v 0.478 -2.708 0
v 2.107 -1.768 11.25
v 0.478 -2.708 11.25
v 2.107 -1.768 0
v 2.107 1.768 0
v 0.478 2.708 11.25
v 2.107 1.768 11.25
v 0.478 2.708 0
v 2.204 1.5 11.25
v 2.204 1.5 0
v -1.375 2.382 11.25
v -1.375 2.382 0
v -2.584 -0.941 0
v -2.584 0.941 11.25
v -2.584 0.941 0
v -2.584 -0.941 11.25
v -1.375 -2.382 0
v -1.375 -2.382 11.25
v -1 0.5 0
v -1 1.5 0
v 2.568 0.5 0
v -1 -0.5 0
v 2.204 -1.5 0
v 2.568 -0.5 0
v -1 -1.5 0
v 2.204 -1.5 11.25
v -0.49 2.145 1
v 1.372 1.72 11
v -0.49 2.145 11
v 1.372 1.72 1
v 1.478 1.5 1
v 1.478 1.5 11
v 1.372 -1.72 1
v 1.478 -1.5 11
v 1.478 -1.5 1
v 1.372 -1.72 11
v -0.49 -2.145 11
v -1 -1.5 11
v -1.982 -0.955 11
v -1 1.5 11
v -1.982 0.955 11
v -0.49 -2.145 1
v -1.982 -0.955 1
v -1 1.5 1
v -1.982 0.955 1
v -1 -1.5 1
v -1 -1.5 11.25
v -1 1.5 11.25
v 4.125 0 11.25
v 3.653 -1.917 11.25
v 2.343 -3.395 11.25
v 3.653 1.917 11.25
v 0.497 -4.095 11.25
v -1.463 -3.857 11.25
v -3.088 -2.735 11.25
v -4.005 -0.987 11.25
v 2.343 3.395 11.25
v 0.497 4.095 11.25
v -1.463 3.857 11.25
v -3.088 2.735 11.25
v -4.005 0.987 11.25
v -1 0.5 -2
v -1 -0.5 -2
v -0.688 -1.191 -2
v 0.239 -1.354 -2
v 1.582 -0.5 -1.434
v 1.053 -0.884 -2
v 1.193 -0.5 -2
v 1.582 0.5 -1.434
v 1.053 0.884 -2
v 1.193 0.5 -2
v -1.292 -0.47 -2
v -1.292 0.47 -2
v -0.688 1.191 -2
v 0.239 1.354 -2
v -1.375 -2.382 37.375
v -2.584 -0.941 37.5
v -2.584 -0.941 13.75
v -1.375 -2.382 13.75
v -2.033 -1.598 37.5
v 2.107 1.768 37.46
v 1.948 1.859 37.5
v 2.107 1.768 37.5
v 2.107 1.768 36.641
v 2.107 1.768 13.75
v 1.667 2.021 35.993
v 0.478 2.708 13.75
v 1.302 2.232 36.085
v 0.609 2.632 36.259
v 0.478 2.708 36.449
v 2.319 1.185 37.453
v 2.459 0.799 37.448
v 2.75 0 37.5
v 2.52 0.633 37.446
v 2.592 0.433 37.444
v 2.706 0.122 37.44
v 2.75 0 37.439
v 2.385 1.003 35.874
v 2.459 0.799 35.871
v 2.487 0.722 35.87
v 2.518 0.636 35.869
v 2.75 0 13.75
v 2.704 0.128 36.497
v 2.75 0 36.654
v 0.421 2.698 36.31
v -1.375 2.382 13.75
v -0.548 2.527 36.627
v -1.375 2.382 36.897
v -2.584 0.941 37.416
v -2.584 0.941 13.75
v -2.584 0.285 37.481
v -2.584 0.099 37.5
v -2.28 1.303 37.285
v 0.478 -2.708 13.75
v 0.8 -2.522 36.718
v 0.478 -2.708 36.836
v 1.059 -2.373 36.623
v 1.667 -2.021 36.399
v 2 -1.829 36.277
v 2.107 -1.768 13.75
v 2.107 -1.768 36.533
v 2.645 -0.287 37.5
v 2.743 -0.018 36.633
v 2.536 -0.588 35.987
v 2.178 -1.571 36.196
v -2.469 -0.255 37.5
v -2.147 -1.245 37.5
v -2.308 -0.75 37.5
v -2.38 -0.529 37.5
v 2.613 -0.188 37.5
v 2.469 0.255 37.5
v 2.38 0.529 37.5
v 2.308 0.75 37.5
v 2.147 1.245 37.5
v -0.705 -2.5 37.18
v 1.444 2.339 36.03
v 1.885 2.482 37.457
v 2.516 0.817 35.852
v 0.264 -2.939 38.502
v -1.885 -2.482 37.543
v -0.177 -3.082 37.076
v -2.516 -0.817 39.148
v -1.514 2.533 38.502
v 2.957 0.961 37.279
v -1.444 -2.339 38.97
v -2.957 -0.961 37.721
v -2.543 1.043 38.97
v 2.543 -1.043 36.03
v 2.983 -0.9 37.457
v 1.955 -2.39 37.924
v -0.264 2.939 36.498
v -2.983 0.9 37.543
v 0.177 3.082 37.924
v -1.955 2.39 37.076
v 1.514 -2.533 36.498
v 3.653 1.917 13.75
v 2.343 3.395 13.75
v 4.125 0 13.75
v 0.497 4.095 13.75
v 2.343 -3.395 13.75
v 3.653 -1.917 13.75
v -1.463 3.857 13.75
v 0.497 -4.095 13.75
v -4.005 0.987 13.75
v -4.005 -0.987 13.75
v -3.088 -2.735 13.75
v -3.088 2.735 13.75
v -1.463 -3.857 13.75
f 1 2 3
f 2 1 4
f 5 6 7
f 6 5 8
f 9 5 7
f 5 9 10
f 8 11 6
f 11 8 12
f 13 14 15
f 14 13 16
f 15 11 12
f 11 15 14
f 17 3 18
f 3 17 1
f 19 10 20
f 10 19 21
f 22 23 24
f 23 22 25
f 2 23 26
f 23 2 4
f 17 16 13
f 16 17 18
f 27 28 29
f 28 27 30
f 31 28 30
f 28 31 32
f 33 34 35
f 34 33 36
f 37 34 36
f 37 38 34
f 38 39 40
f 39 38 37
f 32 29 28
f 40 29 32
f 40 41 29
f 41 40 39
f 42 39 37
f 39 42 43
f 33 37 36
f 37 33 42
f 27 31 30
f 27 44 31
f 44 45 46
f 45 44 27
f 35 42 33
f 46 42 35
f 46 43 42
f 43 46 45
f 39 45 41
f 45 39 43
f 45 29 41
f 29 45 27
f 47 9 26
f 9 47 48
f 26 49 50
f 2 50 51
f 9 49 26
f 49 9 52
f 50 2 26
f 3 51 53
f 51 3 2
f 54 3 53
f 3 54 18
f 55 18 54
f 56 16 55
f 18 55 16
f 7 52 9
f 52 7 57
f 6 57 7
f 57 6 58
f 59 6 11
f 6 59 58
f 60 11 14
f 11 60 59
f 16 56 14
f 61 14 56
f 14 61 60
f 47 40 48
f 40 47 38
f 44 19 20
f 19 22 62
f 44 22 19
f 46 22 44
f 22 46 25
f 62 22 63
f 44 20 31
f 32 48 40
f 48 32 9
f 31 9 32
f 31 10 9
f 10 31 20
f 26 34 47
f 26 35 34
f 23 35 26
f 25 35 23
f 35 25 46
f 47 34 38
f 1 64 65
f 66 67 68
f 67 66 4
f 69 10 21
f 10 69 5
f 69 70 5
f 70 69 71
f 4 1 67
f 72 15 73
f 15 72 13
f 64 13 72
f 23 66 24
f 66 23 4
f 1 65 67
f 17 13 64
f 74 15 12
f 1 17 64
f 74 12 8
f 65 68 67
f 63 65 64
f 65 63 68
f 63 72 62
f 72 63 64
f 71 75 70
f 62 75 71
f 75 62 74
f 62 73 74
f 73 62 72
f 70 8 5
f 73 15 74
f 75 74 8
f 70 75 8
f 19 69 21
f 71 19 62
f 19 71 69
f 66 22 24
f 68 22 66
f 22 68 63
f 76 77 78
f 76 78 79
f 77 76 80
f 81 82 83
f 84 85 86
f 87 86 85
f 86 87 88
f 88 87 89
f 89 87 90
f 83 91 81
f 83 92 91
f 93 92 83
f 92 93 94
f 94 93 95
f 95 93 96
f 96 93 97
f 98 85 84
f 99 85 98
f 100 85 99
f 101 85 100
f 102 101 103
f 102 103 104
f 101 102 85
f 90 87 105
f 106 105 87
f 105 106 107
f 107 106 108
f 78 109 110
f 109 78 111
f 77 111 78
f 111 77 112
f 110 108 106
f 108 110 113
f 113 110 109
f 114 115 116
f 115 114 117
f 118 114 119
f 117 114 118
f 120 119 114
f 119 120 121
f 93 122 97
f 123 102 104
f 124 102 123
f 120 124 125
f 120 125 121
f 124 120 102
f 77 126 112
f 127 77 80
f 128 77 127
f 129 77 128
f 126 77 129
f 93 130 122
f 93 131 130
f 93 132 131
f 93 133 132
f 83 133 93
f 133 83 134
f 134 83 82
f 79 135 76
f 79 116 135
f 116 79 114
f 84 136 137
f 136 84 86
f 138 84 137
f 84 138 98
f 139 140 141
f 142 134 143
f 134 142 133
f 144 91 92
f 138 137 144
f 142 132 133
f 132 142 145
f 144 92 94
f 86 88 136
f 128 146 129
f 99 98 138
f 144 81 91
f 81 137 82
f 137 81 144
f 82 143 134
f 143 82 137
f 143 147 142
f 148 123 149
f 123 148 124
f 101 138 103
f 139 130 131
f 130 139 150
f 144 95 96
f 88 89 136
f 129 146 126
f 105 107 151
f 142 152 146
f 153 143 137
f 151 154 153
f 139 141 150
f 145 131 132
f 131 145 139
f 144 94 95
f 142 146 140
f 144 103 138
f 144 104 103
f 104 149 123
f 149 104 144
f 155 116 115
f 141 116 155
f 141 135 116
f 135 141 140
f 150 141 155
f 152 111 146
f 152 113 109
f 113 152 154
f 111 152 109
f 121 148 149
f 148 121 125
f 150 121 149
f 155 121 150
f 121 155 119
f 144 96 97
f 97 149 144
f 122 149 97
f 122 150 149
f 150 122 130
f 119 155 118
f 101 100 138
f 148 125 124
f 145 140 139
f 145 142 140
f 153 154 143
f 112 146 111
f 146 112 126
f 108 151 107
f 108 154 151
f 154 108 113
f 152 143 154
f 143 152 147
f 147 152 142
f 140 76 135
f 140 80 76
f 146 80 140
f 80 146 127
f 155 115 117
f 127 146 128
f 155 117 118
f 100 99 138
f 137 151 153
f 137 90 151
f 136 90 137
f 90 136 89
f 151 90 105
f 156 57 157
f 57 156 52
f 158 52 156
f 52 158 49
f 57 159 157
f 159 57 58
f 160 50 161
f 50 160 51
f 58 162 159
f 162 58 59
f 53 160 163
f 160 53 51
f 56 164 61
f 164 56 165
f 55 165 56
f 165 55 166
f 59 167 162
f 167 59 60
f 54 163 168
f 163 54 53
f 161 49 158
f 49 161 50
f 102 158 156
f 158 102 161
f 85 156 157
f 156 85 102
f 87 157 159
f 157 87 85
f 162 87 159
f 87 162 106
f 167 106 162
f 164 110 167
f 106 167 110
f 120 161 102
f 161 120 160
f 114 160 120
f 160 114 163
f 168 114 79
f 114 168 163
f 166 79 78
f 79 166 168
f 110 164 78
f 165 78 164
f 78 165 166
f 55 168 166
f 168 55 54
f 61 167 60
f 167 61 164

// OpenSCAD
$stem_width = 5.5/2;

difference() {
    cylinder(r=$stem_width, h=12.5);
    translate([0,0,1]) cylinder(r=$stem_width/5*4, h=10);
    translate([1.5,0,5]) cube([5,3,12.5], center=true);
}
difference() {
    translate([0,0,-1]) cylinder(r2=$stem_width,r1=$stem_width/2, h=2, center=true);
    translate([1.5,0,0]) cube([5,1,12.5], center=true);
    }

translate([0,0,12.5]) cylinder(r=$stem_width*1.5, h=2.5, center=true);

union() {
    translate([0,0,12.5]) cylinder(r=$stem_width, h=25);
    translate([0,0,37.5]) rotate([0,18,18]) cylinder(r=$stem_width+$stem_width/10, h=1.5, center=true);
}
